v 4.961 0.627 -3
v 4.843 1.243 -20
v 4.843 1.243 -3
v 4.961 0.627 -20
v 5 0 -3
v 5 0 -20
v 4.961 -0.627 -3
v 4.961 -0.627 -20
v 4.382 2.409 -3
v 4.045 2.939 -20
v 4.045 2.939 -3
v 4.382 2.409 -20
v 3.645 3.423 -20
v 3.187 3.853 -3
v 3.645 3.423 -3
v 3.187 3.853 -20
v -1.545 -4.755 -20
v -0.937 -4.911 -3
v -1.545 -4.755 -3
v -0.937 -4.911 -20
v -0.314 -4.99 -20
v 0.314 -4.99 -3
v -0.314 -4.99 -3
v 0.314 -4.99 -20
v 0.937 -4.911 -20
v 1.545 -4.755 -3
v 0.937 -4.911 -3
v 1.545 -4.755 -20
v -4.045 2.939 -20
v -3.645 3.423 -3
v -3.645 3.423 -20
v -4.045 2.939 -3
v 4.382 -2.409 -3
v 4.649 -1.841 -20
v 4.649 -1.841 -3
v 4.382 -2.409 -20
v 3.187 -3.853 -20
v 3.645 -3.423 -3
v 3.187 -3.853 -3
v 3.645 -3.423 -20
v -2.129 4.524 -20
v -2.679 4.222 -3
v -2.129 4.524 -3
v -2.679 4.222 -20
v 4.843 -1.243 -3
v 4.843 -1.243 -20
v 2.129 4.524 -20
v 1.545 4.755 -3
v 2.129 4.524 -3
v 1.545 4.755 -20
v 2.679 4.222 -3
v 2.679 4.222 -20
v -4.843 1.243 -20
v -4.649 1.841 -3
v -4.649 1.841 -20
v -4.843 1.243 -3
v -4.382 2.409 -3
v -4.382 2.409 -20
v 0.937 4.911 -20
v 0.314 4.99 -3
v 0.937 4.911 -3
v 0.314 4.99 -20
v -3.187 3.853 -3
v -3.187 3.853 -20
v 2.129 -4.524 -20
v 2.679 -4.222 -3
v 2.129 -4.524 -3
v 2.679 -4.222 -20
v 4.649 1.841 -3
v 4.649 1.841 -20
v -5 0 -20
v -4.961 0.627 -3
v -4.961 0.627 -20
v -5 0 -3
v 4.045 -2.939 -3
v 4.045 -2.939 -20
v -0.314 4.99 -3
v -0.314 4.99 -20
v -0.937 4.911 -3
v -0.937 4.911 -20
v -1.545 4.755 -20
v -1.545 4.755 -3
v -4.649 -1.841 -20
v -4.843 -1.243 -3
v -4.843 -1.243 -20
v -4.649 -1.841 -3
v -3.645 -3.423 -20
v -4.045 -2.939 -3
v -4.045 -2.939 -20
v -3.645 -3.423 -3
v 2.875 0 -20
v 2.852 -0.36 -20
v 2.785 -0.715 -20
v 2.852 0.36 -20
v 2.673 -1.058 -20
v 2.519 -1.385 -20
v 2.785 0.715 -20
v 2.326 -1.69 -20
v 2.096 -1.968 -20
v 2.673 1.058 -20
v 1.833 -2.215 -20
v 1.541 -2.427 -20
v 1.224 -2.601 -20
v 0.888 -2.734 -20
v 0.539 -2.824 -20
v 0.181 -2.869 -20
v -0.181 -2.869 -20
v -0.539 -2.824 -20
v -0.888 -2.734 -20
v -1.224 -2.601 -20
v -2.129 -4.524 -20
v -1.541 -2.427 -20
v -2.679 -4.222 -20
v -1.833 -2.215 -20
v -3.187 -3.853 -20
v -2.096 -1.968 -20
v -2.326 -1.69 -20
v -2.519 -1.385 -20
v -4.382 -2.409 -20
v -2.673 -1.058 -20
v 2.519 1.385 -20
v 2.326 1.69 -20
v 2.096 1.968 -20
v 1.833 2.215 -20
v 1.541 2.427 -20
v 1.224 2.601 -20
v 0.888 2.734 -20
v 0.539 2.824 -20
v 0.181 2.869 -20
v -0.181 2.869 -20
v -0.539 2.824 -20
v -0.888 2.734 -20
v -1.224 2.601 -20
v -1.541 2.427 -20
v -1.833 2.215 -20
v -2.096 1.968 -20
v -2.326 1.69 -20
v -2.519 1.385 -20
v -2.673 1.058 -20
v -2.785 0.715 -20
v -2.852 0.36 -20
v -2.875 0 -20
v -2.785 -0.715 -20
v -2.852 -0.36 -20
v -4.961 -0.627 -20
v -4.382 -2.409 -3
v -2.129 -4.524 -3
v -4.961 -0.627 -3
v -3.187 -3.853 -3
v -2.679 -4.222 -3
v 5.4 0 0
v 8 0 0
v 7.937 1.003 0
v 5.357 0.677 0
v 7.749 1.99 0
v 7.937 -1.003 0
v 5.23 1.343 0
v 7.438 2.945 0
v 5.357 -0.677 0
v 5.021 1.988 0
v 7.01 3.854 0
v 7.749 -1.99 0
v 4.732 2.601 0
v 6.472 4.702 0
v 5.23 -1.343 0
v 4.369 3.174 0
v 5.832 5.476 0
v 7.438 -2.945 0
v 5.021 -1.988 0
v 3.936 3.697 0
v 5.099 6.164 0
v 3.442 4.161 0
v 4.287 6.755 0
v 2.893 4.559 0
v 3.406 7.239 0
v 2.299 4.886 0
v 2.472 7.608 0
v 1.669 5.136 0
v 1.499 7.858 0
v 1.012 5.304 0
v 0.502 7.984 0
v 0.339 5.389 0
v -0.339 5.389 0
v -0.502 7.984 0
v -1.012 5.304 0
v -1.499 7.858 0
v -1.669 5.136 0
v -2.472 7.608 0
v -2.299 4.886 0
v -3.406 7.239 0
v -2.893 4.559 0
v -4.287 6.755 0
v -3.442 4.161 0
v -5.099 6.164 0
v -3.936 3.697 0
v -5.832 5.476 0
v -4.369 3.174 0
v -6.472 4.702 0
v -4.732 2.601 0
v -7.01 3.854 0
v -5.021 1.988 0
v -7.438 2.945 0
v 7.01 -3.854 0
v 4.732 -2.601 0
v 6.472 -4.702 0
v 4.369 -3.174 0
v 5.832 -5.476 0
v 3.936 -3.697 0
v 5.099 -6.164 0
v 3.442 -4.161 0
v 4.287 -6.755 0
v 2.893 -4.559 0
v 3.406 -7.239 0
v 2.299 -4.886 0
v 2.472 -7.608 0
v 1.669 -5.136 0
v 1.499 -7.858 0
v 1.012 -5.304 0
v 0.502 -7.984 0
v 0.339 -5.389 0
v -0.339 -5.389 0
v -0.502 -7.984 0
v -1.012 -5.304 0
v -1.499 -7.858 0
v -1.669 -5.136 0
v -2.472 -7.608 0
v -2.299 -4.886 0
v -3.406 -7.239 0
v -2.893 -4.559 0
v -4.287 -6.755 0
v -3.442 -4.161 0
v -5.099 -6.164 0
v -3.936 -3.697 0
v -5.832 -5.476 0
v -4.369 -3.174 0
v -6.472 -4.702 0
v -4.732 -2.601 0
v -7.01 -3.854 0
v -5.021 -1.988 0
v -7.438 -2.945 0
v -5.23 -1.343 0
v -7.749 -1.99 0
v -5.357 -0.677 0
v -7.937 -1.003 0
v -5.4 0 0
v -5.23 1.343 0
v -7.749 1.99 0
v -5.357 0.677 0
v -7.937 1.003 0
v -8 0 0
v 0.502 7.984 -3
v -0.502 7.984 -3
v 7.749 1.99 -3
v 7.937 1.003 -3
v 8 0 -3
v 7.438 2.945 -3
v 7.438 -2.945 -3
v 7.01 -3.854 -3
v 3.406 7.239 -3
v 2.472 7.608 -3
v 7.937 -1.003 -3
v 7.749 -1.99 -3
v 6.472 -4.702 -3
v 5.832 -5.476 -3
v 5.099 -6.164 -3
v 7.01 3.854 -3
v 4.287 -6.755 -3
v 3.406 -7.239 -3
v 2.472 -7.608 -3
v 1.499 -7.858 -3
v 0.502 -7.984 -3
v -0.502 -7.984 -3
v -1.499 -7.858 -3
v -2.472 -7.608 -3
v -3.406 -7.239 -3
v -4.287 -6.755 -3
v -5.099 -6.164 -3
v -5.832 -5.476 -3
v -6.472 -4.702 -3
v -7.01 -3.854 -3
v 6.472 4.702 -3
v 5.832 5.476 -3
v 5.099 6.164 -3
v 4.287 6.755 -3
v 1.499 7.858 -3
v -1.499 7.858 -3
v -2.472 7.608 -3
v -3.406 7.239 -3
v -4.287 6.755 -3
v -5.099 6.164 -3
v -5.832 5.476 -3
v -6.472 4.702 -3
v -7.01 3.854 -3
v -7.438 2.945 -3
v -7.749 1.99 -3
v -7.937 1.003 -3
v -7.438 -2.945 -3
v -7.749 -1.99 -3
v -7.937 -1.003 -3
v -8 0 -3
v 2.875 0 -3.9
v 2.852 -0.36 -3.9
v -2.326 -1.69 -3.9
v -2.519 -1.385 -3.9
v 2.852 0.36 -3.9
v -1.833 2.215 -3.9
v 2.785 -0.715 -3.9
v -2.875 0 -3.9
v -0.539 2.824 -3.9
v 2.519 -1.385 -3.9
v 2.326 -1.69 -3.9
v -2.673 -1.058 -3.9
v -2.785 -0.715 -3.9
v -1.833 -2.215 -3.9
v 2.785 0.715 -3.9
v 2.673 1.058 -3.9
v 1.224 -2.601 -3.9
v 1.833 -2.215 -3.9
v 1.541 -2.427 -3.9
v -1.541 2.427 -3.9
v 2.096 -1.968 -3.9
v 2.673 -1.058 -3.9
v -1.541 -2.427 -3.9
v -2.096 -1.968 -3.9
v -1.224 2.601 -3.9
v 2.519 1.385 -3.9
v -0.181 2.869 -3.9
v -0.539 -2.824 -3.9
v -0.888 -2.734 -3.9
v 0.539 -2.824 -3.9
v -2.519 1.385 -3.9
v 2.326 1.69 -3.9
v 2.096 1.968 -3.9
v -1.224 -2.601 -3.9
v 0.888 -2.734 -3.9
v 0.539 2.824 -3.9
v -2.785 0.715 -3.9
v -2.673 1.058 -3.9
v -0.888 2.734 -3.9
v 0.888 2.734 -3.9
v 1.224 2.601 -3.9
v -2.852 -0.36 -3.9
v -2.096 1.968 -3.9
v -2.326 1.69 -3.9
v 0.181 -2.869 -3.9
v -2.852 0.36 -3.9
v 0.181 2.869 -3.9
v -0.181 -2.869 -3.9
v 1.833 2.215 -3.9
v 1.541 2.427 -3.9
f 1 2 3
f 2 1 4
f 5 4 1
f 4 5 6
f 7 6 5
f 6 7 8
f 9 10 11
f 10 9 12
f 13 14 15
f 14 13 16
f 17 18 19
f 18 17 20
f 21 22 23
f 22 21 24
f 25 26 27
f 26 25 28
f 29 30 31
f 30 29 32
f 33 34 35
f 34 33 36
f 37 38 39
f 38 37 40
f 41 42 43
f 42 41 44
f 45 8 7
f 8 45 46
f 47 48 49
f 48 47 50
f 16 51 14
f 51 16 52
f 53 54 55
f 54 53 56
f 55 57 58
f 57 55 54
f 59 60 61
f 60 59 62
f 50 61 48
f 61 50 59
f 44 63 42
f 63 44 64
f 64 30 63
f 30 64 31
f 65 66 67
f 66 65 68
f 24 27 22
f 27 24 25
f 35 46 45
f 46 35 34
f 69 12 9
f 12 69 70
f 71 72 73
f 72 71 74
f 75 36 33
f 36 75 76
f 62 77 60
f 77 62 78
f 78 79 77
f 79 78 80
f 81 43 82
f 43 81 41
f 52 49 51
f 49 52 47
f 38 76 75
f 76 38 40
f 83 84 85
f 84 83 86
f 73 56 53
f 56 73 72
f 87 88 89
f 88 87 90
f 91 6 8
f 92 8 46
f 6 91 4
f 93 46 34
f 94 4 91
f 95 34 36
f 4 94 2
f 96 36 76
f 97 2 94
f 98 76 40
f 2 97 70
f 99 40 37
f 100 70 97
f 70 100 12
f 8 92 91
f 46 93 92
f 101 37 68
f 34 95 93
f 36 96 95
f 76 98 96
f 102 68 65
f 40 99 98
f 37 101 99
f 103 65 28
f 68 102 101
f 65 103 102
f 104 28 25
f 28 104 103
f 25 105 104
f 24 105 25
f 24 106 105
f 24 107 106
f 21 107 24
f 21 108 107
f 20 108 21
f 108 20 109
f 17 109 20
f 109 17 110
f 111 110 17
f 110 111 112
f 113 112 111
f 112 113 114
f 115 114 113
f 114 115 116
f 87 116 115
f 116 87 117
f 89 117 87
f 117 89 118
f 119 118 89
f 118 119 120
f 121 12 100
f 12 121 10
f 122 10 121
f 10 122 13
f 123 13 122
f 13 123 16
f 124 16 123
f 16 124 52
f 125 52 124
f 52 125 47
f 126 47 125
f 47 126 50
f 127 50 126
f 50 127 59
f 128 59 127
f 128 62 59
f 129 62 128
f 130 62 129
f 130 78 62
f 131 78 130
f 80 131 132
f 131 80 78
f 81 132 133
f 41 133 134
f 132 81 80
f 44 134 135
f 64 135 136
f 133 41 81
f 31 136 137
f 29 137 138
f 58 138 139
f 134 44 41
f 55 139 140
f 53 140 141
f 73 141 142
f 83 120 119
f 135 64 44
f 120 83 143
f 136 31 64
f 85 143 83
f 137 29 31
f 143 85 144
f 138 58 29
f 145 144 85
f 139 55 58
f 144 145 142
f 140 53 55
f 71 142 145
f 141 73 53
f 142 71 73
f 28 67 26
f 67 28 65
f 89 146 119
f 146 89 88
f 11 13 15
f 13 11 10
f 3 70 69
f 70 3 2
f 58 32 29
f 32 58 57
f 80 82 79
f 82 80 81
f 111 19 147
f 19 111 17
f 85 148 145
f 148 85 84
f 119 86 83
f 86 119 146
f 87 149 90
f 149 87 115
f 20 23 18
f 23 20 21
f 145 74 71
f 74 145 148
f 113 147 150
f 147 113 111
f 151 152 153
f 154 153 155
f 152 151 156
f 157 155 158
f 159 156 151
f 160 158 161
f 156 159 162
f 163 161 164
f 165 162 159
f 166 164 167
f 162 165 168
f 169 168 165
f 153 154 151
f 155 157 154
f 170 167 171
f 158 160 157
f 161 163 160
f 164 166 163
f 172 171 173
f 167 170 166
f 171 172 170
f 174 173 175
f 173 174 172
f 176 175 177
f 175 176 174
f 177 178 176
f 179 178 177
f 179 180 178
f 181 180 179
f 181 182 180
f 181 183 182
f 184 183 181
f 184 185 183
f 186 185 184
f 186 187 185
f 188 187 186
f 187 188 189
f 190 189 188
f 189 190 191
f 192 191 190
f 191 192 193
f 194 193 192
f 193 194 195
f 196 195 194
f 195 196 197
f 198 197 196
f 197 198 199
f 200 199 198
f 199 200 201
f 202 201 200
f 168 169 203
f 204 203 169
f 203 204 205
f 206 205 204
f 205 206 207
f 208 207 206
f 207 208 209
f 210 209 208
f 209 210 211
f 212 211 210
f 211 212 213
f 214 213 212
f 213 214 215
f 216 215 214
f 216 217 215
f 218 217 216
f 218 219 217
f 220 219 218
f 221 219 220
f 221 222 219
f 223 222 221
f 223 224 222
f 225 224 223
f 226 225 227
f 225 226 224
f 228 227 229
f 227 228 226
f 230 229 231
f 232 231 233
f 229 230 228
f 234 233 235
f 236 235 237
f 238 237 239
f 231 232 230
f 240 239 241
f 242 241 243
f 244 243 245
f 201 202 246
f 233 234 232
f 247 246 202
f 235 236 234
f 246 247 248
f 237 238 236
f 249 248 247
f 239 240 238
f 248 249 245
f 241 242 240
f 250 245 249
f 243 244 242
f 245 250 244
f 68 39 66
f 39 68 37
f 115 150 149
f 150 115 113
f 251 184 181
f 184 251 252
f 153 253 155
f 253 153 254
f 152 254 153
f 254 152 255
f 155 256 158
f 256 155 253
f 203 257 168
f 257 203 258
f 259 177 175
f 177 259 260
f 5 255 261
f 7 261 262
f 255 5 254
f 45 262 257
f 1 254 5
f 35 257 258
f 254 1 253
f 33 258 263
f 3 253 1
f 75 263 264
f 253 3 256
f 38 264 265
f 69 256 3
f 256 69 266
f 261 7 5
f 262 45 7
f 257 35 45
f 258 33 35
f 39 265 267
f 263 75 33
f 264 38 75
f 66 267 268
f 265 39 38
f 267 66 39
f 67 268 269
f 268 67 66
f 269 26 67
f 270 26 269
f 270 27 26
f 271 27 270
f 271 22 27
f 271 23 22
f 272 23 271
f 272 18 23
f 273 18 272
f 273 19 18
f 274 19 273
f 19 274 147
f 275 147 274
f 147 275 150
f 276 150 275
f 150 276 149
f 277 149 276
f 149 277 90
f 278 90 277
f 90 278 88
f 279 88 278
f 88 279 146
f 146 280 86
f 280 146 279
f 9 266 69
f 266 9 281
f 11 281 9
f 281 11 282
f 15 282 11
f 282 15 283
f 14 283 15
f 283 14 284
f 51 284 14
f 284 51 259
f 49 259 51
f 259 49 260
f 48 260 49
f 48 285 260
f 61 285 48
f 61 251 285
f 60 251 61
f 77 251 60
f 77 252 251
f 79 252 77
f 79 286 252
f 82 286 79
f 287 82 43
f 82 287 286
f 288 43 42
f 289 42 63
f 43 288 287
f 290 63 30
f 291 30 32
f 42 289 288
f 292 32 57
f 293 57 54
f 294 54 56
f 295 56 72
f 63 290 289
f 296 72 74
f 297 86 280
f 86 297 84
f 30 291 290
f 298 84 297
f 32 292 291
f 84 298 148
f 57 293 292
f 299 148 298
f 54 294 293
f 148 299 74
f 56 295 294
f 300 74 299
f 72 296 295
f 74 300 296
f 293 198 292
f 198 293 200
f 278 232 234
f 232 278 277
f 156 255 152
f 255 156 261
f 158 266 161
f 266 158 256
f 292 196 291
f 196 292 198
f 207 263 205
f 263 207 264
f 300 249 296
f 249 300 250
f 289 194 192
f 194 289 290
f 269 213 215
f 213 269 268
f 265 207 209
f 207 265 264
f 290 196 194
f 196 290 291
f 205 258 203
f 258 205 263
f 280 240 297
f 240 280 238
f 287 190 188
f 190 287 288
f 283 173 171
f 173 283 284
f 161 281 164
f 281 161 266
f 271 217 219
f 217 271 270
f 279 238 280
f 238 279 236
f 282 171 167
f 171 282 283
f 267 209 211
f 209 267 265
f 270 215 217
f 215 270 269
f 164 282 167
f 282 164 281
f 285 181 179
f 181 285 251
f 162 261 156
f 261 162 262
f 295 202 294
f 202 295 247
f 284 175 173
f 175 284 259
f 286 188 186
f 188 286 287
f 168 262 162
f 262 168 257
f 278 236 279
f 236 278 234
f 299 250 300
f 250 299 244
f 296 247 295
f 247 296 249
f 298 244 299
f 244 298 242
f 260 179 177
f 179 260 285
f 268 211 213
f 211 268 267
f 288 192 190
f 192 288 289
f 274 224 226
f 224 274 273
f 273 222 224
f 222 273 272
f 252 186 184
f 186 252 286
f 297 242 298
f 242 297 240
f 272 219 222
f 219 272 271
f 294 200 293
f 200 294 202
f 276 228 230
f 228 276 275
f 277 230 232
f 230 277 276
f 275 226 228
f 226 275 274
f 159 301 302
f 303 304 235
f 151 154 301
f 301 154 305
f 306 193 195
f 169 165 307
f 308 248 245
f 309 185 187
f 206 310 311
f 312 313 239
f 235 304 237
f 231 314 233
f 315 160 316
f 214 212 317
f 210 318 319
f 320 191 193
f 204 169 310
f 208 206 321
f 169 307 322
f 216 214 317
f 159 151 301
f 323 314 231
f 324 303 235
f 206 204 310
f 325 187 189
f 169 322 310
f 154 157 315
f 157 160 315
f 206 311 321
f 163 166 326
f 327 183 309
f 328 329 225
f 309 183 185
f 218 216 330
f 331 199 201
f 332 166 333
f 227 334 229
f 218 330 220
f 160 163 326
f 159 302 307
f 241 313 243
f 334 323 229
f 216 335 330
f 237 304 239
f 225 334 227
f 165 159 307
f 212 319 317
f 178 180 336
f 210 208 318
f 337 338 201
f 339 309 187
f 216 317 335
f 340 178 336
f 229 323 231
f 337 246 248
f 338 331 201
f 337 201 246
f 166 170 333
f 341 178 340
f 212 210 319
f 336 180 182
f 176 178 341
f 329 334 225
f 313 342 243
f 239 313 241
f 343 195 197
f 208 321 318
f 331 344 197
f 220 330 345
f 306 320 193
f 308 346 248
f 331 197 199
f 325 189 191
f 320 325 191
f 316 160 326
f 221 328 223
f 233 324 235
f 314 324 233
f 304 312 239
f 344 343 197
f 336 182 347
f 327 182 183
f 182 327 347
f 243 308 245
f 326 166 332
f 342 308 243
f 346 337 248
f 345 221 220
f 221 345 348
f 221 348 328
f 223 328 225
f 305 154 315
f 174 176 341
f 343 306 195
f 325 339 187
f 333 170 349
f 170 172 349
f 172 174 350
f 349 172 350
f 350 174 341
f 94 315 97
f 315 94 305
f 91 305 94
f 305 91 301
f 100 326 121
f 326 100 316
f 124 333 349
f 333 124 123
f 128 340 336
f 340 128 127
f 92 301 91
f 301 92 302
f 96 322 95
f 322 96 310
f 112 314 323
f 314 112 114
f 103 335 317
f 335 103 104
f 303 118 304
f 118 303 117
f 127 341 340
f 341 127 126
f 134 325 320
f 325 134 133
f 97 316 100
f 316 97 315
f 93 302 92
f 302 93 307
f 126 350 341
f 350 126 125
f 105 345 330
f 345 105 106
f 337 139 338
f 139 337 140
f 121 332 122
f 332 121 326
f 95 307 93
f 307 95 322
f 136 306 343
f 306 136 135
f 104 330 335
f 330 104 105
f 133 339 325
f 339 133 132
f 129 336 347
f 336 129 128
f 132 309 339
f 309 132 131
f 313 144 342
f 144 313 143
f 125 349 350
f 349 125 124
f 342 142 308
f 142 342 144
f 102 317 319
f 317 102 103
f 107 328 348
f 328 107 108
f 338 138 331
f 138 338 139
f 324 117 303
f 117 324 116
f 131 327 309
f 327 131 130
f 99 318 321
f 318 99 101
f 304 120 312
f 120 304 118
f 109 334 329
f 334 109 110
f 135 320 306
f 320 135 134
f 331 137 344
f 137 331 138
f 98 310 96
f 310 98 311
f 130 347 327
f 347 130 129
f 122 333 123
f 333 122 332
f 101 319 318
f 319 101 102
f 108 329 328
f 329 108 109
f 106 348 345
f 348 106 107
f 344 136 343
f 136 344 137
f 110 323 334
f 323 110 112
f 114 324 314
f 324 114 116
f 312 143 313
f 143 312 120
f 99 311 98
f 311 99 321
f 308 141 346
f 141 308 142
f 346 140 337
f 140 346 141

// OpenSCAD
$fn = 50;


difference() {
	union() {
		translate(v = [0, 0, -20.0000000000]) {
			cylinder(h = 20, r = 5.0000000000);
		}
		translate(v = [0, 0, -3.0000000000]) {
			cylinder(h = 3, r = 8.0000000000);
		}
	}
	union() {
		translate(v = [0, 0, 0]) {
			rotate(a = [0, 0, 0]) {
				difference() {
					union() {
						#translate(v = [0, 0, -20.0000000000]) {
							cylinder(h = 20, r = 2.6000000000);
						}
						#translate(v = [0, 0, -3.9000000000]) {
							cylinder(h = 3.9000000000, r1 = 2.8750000000, r2 = 5.4000000000);
						}
						#translate(v = [0, 0, -20.0000000000]) {
							cylinder(h = 20, r = 2.8750000000);
						}
						#translate(v = [0, 0, -20.0000000000]) {
							cylinder(h = 20, r = 2.6000000000);
						}
					}
					union();
				}
			}
		}
	}
}
